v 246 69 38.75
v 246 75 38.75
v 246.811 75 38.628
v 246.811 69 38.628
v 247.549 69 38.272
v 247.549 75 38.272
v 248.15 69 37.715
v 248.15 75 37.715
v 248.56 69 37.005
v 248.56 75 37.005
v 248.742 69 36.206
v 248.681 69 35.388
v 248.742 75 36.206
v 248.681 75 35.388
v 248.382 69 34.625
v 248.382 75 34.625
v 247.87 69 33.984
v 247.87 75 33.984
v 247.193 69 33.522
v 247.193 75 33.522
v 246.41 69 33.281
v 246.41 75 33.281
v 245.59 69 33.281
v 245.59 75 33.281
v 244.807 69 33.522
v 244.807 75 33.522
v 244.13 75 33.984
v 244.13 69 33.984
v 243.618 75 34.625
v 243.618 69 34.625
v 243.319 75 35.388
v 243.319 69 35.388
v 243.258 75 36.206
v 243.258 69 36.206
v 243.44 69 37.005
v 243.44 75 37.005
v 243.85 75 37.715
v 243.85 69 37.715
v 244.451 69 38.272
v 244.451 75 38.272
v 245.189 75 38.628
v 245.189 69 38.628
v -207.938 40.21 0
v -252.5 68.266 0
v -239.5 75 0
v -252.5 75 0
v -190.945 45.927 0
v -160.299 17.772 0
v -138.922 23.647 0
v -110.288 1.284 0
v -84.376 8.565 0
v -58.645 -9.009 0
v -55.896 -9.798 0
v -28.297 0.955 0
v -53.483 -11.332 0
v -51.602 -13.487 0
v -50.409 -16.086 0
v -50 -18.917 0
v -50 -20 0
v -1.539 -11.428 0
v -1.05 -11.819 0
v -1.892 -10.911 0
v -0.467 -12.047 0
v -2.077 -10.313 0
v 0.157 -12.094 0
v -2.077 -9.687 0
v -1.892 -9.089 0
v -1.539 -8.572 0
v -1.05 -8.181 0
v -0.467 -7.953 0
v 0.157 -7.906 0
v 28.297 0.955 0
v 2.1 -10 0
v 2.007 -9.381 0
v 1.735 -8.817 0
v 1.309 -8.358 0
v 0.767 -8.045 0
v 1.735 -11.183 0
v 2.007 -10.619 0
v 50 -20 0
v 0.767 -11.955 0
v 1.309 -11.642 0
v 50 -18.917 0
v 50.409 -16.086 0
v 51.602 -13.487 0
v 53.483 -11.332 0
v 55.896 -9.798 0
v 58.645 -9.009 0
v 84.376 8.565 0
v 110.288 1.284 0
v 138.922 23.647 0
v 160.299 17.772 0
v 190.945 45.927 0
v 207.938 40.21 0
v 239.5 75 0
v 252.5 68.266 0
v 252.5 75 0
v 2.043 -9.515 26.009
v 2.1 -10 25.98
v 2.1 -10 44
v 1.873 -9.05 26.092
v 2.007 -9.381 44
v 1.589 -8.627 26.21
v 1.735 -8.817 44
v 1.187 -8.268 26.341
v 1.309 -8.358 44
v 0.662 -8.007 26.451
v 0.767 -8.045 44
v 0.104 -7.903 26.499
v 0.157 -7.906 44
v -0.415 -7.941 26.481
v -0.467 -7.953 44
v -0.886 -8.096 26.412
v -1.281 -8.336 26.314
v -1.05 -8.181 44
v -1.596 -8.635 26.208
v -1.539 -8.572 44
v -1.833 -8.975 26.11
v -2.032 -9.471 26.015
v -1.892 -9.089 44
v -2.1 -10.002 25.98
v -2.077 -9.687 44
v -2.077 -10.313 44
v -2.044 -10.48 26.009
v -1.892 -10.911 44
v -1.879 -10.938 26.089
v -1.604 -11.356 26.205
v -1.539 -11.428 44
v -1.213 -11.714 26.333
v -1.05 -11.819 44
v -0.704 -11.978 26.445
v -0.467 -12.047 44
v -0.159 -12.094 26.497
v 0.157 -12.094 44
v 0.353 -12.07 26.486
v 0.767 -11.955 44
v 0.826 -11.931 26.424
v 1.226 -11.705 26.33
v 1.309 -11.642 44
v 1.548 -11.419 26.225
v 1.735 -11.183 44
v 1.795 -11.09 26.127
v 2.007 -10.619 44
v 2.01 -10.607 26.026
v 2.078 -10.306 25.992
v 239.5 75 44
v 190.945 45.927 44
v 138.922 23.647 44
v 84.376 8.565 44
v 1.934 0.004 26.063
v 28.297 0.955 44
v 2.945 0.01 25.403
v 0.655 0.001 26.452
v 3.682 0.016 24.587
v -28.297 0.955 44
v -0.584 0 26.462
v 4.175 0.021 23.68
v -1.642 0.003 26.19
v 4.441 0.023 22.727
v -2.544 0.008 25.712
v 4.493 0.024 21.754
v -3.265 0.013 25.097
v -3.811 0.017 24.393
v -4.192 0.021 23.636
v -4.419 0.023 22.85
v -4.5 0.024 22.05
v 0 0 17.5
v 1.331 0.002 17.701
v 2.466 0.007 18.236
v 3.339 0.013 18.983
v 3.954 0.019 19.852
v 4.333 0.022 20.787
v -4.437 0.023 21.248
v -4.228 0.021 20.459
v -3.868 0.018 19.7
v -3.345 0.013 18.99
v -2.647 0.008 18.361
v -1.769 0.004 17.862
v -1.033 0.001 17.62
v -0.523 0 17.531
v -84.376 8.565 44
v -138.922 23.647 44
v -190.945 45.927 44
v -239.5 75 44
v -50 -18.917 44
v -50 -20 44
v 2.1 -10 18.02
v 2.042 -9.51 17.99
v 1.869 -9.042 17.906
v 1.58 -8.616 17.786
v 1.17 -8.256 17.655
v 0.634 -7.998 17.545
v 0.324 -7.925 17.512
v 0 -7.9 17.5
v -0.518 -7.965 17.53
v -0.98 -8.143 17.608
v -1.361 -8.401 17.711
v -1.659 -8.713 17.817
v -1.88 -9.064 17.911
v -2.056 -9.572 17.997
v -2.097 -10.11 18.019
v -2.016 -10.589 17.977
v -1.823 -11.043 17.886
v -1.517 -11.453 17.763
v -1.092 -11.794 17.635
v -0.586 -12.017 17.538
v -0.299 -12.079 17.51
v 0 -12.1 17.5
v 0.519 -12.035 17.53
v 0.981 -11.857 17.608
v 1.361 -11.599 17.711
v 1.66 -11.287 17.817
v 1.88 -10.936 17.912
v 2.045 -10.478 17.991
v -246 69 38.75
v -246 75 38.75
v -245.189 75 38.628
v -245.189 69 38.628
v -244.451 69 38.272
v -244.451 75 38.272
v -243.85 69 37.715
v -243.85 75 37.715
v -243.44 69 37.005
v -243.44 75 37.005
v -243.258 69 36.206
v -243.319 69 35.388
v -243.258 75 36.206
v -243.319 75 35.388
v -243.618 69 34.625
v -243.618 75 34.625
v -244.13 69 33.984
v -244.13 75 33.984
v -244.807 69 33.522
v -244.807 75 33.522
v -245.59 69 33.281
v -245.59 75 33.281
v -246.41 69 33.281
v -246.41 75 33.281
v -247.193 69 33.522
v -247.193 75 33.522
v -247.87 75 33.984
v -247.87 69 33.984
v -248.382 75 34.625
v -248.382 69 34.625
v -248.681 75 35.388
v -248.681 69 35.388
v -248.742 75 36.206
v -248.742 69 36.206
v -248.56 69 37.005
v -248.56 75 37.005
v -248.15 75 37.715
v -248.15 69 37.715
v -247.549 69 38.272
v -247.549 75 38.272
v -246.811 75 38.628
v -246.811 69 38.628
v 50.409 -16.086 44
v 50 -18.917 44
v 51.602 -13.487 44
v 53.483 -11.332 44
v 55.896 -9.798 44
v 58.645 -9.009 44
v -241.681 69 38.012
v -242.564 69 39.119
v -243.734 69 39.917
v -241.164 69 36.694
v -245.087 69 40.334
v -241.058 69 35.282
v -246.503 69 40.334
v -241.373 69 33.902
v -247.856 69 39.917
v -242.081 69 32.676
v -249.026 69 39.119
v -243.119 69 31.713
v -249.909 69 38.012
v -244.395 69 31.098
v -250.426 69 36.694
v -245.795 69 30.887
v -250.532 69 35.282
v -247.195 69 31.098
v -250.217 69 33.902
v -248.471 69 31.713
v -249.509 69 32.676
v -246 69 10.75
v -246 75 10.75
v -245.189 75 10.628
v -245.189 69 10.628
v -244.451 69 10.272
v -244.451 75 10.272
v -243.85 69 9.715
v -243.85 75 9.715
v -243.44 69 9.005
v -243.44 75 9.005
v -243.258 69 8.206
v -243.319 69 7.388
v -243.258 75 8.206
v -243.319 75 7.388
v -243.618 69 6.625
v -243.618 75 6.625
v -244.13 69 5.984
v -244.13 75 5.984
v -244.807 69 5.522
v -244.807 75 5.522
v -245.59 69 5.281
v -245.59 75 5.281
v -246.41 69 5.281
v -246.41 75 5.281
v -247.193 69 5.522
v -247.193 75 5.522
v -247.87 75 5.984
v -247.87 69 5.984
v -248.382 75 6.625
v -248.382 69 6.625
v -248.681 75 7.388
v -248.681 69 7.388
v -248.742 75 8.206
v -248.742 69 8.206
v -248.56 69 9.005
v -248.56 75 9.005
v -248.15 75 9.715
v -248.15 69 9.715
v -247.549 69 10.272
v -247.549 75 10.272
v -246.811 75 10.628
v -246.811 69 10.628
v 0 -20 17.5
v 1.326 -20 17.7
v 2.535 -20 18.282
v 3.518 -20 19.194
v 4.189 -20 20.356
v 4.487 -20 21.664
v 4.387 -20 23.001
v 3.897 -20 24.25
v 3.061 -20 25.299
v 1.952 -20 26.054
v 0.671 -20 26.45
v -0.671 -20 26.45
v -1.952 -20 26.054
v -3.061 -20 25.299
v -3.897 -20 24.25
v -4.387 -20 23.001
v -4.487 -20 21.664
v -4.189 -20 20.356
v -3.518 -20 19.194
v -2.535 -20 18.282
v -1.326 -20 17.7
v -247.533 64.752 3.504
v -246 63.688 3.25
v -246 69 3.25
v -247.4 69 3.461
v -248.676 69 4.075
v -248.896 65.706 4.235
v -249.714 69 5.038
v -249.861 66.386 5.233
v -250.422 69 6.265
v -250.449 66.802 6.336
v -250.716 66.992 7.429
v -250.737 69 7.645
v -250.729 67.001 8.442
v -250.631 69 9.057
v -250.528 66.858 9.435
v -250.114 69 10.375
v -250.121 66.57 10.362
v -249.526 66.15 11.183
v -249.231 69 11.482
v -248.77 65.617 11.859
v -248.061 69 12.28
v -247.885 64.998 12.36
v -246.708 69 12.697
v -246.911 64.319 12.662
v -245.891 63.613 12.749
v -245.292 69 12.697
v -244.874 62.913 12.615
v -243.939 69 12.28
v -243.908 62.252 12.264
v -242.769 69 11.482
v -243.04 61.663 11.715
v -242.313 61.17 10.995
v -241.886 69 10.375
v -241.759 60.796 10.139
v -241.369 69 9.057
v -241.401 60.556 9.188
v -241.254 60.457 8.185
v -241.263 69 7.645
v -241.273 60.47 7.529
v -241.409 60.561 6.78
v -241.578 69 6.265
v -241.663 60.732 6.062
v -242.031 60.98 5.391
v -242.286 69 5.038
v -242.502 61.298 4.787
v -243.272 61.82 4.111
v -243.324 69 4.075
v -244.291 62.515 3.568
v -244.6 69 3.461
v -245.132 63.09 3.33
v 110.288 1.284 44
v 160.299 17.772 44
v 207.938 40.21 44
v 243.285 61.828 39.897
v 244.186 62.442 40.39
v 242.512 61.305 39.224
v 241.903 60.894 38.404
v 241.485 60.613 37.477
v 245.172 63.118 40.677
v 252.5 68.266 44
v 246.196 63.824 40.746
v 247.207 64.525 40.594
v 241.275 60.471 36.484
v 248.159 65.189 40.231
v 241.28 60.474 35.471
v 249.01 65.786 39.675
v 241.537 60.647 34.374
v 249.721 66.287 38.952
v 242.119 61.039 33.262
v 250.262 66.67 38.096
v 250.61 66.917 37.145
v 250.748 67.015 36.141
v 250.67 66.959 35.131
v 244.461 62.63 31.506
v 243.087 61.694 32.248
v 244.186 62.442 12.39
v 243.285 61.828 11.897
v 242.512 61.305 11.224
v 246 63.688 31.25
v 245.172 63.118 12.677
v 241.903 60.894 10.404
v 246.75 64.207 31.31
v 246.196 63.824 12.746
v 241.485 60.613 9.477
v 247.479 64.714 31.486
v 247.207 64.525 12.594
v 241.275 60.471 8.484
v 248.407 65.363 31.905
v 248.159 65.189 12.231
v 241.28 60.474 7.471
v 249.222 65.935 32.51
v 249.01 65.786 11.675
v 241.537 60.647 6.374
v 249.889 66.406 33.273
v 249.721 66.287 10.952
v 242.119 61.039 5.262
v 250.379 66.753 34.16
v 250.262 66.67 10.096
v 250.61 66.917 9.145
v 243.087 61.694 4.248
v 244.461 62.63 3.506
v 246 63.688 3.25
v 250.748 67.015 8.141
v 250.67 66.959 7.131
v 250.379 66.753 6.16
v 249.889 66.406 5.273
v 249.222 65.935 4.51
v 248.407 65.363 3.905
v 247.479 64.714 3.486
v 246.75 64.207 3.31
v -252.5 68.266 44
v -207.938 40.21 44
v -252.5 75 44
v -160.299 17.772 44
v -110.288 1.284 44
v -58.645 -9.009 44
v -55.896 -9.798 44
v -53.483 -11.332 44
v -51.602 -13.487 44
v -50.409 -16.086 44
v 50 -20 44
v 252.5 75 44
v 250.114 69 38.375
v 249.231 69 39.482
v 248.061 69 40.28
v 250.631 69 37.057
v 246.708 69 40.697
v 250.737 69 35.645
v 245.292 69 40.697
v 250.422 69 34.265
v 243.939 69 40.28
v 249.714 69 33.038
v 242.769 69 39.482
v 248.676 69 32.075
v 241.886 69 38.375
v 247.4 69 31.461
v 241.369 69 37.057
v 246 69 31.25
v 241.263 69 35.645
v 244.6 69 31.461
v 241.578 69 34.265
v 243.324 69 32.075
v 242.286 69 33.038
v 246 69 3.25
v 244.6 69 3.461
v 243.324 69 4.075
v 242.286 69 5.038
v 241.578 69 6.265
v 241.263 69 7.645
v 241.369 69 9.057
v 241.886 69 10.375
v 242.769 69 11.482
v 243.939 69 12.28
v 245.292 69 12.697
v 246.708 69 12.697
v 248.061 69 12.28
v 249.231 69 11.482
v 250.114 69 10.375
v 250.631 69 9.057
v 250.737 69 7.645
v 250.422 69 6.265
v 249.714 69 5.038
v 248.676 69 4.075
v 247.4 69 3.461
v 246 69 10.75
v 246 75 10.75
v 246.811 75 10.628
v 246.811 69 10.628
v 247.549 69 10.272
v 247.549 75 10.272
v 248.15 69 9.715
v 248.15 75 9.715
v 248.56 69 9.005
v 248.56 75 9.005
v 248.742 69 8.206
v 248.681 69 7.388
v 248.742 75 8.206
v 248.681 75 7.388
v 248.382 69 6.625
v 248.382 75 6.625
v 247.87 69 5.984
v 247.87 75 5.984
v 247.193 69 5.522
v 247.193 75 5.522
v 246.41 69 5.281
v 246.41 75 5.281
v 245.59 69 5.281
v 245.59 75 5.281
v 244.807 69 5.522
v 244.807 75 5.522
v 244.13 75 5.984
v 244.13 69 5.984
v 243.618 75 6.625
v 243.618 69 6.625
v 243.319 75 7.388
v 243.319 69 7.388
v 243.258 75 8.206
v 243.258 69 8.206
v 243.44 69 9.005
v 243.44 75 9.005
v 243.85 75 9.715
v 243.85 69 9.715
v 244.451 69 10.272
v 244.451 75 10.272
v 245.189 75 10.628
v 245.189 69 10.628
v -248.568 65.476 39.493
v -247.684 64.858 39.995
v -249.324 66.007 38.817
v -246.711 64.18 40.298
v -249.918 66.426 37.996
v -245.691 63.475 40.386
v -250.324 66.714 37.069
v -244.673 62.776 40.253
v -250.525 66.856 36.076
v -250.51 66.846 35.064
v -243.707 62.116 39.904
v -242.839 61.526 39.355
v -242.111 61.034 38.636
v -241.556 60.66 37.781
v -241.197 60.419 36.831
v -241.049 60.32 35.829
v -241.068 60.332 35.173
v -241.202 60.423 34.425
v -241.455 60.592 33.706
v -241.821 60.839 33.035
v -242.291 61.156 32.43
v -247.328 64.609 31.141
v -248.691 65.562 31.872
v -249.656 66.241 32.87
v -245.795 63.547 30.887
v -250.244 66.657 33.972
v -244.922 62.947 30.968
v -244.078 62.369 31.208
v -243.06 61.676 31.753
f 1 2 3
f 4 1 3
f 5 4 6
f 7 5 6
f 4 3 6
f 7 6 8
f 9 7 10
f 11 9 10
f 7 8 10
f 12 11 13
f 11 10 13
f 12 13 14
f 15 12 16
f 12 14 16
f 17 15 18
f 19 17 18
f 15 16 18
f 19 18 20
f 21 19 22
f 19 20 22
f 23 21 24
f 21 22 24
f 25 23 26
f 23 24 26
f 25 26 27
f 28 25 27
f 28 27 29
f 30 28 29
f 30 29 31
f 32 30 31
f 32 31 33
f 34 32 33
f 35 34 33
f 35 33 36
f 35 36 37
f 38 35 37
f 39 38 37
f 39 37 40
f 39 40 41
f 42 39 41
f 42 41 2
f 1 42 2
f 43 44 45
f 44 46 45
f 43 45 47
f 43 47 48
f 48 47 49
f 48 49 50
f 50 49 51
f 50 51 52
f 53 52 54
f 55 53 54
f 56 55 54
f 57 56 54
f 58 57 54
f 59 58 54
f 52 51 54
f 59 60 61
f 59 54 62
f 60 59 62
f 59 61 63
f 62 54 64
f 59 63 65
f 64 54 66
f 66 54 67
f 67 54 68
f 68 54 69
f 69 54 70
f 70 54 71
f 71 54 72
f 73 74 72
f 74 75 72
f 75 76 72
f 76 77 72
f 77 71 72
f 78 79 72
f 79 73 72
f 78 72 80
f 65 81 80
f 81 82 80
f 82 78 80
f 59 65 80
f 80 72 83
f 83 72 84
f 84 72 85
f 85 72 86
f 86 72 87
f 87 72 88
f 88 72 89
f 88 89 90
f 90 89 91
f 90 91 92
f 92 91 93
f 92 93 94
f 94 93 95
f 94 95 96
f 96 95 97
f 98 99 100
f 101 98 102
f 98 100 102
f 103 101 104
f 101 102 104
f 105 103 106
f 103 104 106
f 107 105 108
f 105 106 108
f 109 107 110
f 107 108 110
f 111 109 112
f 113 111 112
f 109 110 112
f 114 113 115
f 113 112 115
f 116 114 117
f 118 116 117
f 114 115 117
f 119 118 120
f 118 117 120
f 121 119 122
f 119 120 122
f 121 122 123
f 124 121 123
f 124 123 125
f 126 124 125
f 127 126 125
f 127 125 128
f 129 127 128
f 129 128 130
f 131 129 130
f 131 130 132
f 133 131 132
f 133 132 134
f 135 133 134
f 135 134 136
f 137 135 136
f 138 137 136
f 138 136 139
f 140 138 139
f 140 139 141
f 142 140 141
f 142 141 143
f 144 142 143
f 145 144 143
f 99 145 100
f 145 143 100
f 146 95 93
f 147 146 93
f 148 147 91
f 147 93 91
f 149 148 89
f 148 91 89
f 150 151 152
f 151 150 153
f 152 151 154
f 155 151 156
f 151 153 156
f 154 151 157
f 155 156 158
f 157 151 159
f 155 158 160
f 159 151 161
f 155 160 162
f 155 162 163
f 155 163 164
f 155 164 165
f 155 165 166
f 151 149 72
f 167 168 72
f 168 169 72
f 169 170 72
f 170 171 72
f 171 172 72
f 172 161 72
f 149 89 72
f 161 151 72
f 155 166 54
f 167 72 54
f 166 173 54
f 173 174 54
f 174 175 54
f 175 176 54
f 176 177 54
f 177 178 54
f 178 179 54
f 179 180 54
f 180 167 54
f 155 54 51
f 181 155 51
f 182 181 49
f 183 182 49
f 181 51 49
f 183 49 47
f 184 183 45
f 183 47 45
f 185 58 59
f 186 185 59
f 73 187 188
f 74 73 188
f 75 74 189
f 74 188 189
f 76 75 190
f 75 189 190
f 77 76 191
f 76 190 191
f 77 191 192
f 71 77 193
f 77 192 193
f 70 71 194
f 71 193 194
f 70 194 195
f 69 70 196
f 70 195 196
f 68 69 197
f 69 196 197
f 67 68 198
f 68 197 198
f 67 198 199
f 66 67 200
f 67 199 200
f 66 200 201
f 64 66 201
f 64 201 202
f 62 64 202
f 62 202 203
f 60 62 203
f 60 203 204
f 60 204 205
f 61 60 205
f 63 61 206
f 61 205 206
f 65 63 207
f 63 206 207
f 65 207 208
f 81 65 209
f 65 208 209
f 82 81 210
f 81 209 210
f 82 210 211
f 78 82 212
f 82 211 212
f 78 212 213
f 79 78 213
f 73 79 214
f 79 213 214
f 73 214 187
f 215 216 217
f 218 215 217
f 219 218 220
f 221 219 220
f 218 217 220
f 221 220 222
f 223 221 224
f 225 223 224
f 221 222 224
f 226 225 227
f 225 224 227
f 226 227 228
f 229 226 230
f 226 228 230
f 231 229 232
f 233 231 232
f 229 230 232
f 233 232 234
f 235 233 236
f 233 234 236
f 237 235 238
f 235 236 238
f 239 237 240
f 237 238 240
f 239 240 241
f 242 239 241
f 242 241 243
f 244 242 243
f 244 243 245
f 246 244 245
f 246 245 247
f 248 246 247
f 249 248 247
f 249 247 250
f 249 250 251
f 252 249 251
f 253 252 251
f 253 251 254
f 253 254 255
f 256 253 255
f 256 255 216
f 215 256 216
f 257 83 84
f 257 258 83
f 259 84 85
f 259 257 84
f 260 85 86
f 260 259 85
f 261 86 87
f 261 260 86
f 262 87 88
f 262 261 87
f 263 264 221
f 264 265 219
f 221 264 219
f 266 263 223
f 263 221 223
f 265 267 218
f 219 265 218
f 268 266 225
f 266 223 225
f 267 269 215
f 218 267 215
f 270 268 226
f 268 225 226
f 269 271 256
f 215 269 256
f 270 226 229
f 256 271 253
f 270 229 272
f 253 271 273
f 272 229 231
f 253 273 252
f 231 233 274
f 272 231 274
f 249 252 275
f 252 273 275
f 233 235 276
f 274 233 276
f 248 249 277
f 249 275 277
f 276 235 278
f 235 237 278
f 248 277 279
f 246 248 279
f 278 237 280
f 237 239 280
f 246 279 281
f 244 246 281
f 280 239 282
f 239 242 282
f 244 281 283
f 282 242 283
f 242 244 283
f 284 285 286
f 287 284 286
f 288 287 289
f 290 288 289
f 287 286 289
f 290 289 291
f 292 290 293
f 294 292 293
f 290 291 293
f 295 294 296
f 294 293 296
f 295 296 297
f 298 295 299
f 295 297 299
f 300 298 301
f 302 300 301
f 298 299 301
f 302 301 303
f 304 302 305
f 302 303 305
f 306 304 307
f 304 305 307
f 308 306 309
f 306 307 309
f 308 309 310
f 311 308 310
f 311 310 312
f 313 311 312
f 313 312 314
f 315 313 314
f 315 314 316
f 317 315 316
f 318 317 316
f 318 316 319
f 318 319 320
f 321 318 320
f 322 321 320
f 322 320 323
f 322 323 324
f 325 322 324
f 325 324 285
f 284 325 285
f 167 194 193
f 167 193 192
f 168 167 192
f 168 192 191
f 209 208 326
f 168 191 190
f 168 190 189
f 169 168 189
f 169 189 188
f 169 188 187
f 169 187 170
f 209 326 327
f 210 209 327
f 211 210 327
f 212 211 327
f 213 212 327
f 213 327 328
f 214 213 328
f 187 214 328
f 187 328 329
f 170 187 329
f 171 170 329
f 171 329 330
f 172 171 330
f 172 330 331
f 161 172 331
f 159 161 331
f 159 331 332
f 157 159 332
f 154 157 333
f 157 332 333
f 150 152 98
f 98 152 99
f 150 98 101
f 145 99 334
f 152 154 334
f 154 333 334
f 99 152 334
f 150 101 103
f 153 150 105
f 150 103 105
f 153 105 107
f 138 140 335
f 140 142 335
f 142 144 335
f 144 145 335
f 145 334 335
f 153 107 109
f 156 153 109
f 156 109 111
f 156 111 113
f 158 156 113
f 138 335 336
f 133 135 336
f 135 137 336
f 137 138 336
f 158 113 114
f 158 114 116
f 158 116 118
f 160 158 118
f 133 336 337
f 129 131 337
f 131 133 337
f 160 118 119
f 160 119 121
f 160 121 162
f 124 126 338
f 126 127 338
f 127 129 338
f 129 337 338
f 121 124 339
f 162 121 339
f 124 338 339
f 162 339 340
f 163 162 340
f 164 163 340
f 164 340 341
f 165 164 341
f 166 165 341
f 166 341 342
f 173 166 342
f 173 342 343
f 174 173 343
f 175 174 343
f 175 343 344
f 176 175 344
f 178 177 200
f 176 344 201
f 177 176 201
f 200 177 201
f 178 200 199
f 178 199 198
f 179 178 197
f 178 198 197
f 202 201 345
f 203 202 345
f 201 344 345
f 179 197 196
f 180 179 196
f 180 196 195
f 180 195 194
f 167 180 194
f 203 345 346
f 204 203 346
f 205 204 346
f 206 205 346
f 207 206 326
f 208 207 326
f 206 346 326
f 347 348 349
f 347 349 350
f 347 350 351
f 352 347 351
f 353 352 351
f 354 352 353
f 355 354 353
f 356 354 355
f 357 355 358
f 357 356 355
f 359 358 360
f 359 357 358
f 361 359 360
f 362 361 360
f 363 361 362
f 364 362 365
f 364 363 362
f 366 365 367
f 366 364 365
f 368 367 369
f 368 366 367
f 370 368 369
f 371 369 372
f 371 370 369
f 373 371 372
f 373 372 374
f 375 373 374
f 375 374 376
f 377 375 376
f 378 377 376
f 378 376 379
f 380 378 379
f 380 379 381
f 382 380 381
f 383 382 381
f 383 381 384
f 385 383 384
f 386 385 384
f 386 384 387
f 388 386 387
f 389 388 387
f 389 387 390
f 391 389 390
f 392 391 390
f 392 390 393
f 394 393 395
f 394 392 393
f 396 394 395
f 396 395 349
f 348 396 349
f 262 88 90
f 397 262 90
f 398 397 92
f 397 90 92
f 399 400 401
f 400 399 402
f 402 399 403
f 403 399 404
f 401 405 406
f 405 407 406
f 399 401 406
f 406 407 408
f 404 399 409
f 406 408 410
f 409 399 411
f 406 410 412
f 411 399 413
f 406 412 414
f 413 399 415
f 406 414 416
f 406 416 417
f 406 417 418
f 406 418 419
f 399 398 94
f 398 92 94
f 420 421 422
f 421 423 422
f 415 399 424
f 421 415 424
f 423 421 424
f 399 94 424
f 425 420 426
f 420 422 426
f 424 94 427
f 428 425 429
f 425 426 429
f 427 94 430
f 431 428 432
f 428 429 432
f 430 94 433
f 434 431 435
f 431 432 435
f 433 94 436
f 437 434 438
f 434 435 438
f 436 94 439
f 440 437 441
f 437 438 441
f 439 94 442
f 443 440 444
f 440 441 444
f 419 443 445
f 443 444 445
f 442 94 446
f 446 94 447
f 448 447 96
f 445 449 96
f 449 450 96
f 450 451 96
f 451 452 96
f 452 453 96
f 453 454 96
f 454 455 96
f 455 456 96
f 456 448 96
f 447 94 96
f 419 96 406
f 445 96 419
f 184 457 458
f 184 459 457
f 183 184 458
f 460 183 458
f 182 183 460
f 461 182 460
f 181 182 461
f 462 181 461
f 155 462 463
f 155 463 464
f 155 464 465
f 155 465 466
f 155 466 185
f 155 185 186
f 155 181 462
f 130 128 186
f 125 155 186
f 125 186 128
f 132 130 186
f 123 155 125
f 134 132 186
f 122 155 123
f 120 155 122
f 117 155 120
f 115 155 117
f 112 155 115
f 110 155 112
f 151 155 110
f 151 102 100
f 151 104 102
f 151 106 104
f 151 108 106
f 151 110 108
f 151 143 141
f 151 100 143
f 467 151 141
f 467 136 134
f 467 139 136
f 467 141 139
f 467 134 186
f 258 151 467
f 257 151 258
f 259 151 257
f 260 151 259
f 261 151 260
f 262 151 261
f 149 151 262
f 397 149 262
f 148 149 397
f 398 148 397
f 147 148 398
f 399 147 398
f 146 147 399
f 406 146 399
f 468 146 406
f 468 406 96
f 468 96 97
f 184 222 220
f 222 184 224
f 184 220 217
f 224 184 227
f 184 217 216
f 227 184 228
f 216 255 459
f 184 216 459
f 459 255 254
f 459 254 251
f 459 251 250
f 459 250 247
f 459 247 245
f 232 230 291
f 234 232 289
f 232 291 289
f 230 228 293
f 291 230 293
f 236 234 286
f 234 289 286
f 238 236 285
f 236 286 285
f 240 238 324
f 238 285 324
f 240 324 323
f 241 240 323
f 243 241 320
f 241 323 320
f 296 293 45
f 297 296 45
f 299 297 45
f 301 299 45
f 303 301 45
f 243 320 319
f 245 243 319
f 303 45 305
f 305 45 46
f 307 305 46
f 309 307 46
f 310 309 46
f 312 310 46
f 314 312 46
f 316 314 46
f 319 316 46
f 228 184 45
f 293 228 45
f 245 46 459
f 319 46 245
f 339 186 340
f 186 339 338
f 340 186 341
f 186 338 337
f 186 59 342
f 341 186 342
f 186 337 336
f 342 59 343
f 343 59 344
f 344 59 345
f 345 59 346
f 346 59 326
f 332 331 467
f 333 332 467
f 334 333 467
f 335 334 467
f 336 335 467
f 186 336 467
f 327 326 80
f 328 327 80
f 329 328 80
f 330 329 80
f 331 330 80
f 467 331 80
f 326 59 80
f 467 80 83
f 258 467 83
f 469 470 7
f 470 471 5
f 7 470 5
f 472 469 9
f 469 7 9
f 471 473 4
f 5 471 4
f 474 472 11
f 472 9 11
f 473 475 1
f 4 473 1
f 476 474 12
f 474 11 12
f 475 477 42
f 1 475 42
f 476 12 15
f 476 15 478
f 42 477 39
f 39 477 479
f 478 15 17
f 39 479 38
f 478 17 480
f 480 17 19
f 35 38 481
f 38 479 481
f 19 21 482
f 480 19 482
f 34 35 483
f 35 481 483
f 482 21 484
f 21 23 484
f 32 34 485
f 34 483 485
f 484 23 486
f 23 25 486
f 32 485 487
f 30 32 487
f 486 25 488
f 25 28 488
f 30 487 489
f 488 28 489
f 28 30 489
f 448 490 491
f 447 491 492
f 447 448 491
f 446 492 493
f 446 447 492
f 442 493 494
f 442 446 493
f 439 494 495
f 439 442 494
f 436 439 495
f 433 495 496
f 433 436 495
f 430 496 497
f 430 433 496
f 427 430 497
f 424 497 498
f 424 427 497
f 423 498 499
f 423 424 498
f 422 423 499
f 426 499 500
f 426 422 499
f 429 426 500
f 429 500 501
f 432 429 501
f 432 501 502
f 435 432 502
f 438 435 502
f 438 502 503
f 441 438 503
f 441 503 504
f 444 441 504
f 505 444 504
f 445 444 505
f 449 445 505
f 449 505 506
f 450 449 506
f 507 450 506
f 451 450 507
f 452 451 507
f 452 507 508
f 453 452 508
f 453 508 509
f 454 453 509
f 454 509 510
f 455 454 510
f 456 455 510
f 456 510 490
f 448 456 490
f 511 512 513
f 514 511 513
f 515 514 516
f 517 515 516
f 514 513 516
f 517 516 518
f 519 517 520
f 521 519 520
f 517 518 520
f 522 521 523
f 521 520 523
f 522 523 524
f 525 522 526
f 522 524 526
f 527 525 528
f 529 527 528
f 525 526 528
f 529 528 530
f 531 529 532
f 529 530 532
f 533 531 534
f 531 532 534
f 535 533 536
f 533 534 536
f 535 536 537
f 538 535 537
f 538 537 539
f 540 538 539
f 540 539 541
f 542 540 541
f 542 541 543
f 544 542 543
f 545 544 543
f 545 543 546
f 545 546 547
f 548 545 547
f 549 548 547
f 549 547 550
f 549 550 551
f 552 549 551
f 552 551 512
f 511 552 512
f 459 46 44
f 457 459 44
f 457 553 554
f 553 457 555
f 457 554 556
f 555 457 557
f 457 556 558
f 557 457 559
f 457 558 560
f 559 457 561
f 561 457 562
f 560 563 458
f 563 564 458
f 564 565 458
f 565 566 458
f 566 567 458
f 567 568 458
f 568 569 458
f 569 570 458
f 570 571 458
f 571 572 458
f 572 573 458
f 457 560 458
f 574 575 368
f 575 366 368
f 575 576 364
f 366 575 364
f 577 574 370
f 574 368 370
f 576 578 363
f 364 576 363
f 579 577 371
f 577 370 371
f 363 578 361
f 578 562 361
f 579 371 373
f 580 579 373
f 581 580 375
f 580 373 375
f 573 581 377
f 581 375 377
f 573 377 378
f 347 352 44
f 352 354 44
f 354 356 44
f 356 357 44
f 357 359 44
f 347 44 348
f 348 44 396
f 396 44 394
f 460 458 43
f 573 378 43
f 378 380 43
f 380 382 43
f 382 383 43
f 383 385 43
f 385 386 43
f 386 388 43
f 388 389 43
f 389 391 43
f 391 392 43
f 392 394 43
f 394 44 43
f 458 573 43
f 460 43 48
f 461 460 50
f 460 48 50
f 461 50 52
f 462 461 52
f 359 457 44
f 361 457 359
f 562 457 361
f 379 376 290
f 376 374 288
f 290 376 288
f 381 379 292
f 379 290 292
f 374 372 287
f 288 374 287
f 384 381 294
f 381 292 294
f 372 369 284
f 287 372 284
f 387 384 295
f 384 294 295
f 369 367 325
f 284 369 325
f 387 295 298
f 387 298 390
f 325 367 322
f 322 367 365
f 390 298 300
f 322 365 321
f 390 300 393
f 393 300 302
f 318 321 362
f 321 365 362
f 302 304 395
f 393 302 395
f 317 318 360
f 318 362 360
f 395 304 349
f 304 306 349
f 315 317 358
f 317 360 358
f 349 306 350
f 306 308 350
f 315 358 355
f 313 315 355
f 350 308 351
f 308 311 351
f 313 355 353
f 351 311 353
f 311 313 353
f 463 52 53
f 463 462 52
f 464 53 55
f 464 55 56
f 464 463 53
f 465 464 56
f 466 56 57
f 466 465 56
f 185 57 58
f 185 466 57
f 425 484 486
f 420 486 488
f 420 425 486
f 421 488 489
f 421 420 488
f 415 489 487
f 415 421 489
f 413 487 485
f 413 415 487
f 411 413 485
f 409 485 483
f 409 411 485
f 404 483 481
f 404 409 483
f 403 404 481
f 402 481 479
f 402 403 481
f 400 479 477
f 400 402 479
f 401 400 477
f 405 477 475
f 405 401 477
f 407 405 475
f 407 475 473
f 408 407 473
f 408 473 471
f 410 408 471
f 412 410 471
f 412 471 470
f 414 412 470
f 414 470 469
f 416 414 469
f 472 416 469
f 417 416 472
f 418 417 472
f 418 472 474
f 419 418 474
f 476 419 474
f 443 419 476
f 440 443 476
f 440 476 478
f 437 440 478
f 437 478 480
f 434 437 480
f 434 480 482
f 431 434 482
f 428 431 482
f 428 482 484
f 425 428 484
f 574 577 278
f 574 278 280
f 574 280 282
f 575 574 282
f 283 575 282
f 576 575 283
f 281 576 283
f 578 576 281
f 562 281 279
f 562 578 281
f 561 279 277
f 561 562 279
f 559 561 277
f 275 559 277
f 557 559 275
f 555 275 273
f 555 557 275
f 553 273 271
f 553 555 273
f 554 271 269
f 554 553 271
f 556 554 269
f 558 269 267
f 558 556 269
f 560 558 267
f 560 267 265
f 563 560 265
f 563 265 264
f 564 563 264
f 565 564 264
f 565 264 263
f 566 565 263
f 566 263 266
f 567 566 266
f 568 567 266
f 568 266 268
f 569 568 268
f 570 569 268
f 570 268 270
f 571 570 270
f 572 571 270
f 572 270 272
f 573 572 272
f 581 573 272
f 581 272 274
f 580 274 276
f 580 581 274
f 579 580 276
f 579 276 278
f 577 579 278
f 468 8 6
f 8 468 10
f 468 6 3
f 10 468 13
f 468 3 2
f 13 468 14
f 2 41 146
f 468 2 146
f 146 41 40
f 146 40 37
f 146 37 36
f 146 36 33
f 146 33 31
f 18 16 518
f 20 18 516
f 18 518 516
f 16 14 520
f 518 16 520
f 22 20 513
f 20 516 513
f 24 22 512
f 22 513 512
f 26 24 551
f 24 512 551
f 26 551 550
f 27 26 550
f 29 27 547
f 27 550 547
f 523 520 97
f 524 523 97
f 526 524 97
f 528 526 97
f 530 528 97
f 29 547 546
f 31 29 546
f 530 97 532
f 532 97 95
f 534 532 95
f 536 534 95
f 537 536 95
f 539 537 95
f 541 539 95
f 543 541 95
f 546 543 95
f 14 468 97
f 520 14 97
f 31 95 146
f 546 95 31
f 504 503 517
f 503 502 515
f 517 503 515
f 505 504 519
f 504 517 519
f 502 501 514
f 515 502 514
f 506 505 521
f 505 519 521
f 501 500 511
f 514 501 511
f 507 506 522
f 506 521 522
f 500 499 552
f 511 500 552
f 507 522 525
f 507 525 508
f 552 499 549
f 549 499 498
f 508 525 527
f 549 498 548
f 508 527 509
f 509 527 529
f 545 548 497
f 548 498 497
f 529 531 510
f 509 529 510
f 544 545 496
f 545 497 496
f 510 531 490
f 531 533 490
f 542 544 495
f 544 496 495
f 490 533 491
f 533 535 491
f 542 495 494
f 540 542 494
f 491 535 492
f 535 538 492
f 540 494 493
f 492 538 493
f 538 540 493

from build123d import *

# Parameters (mm, degrees)
BOSS_EXTRU_1_DEPTH       = 44
ESQUISSE2_R              = 4.5
ENL_V_MAT_EXTRU_1_DEPTH  = 96
ESQUISSE6_R              = 2.75
ENL_V_MAT_EXTRU_2_DEPTH  = 96.0000001
ESQUISSE7_R              = 4.75
ENL_V_MAT_EXTRU_3_DEPTH  = 24
ESQUISSE8_R              = 2.75
ENL_V_MAT_EXTRU_4_DEPTH  = 96.0000001
ESQUISSE9_R              = 4.75
ENL_V_MAT_EXTRU_5_DEPTH  = 24
ESQUISSE10_R             = 2.75
ENL_V_MAT_EXTRU_6_DEPTH  = 96.0000001
ESQUISSE11_R             = 4.75
ENL_V_MAT_EXTRU_8_DEPTH  = 24
ESQUISSE13_R             = 4.75
ENL_V_MAT_EXTRU_11_DEPTH = 24
TROU_TARAUD_M51_D        = 4.2
CONG_1_R                 = 10


with BuildPart() as part:
    # Esquisse1 → Boss.-Extru.1 (new body)
    with BuildSketch(Plane.XY):
        with BuildLine():
            Line((-252.5, 75), (-252.5, 68.266055554))
            ThreePointArc((-252.5, 68.266055554), (-156.243343573, 16.179149841), (-50, -10.102813546))
            Line((-50, -10.102813546), (-50, -20))
            Line((-50, -20), (50, -20))
            Line((50, -20), (50, -10.102813546))
            ThreePointArc((50, -10.102813546), (156.243343573, 16.179149841), (252.5, 68.266055554))
            Line((252.5, 68.266055554), (252.5, 75))
            Line((252.5, 75), (239.5, 75))
            ThreePointArc((239.5, 75), (0, 0), (-239.5, 75))
            Line((-239.5, 75), (-252.5, 75))
        make_face()
    extrude(amount=BOSS_EXTRU_1_DEPTH)

    # Esquisse2 → Enlèv. mat.-Extru.1 (cut, through all)
    with BuildSketch(Plane.XZ.offset(20)):
        with Locations(Location((0, 22, 0), (0, 0, 270))):  # turned: the seam where the file's is
            Circle(ESQUISSE2_R)
    extrude(amount=-ENL_V_MAT_EXTRU_1_DEPTH, mode=Mode.SUBTRACT)

    # Esquisse6 → Enlèv. mat.-Extru.2 (cut, through all)
    with BuildSketch(Plane(origin=(0, 75, 0), x_dir=(1, 0, 0), z_dir=(0, 1, 0))):
        with Locations(Location((246, -8, 0), (0, 0, 270))):  # turned: the seam where the file's is
            Circle(ESQUISSE6_R)
    extrude(amount=-ENL_V_MAT_EXTRU_2_DEPTH, mode=Mode.SUBTRACT)

    # Esquisse7 → Enlèv. mat.-Extru.3 (cut)
    with BuildSketch(Plane(origin=(0, 45, 0), x_dir=(-1, 0, 0), z_dir=(0, 1, 0))):
        with Locations(Location((-246, 8, 0), (0, 0, 270))):  # turned: the seam where the file's is
            Circle(ESQUISSE7_R)
    extrude(amount=ENL_V_MAT_EXTRU_3_DEPTH, mode=Mode.SUBTRACT)

    # Esquisse8 → Enlèv. mat.-Extru.4 (cut, through all)
    with BuildSketch(Plane(origin=(0, 75, 0), x_dir=(1, 0, 0), z_dir=(0, 1, 0))):
        with Locations(Location((246, -36, 0), (0, 0, 270))):  # turned: the seam where the file's is
            Circle(ESQUISSE8_R)
    extrude(amount=-ENL_V_MAT_EXTRU_4_DEPTH, mode=Mode.SUBTRACT)

    # Esquisse9 → Enlèv. mat.-Extru.5 (cut)
    with BuildSketch(Plane(origin=(0, 45, 0), x_dir=(-1, 0, 0), z_dir=(0, 1, 0))):
        with Locations(Location((-246, 36, 0), (0, 0, 270))):  # turned: the seam where the file's is
            Circle(ESQUISSE9_R)
    extrude(amount=ENL_V_MAT_EXTRU_5_DEPTH, mode=Mode.SUBTRACT)

    # Esquisse10 → Enlèv. mat.-Extru.6 (cut, through all)
    with BuildSketch(Plane(origin=(0, 75, 0), x_dir=(1, 0, 0), z_dir=(0, 1, 0))):
        with Locations(Location((-246, -8, 0), (0, 0, 270))):  # turned: the seam where the file's is
            Circle(ESQUISSE10_R)
        with Locations(Location((-246, -36, 0), (0, 0, 270))):  # turned: the seam where the file's is
            Circle(ESQUISSE10_R)
    extrude(amount=-ENL_V_MAT_EXTRU_6_DEPTH, mode=Mode.SUBTRACT)

    # Esquisse11 → Enlèv. mat.-Extru.8 (cut)
    with BuildSketch(Plane(origin=(0, 45, 0), x_dir=(-1, 0, 0), z_dir=(0, 1, 0))):
        with Locations(Location((246, 8, 0), (0, 0, 270))):  # turned: the seam where the file's is
            Circle(ESQUISSE11_R)
    extrude(amount=ENL_V_MAT_EXTRU_8_DEPTH, mode=Mode.SUBTRACT)

    # Esquisse13 → Enlèv. mat.-Extru.11 (cut)
    with BuildSketch(Plane(origin=(0, 45, 0), x_dir=(-1, 0, 0), z_dir=(0, 1, 0))):
        with Locations(Location((245.795073353, 35.637141441, 0), (0, 0, 270))):  # turned: the seam where the file's is
            Circle(ESQUISSE13_R)
    extrude(amount=ENL_V_MAT_EXTRU_11_DEPTH, mode=Mode.SUBTRACT)

    # Trou taraudé M51 (through all)
    with Locations(Plane(origin=(0, 0, 0), x_dir=(-1, 0, 0), z_dir=(0, 0, -1))):
        with Locations((0, -10)):
            Hole(TROU_TARAUD_M51_D / 2)

    # Congé1
    cong_1_edges = [part.edges().sort_by_distance(p)[0] for p in [
        (-50, -10.102813546, 22),
        (50, -10.102813546, 22),
    ]]
    fillet(cong_1_edges, radius=CONG_1_R)


solid = part.part
